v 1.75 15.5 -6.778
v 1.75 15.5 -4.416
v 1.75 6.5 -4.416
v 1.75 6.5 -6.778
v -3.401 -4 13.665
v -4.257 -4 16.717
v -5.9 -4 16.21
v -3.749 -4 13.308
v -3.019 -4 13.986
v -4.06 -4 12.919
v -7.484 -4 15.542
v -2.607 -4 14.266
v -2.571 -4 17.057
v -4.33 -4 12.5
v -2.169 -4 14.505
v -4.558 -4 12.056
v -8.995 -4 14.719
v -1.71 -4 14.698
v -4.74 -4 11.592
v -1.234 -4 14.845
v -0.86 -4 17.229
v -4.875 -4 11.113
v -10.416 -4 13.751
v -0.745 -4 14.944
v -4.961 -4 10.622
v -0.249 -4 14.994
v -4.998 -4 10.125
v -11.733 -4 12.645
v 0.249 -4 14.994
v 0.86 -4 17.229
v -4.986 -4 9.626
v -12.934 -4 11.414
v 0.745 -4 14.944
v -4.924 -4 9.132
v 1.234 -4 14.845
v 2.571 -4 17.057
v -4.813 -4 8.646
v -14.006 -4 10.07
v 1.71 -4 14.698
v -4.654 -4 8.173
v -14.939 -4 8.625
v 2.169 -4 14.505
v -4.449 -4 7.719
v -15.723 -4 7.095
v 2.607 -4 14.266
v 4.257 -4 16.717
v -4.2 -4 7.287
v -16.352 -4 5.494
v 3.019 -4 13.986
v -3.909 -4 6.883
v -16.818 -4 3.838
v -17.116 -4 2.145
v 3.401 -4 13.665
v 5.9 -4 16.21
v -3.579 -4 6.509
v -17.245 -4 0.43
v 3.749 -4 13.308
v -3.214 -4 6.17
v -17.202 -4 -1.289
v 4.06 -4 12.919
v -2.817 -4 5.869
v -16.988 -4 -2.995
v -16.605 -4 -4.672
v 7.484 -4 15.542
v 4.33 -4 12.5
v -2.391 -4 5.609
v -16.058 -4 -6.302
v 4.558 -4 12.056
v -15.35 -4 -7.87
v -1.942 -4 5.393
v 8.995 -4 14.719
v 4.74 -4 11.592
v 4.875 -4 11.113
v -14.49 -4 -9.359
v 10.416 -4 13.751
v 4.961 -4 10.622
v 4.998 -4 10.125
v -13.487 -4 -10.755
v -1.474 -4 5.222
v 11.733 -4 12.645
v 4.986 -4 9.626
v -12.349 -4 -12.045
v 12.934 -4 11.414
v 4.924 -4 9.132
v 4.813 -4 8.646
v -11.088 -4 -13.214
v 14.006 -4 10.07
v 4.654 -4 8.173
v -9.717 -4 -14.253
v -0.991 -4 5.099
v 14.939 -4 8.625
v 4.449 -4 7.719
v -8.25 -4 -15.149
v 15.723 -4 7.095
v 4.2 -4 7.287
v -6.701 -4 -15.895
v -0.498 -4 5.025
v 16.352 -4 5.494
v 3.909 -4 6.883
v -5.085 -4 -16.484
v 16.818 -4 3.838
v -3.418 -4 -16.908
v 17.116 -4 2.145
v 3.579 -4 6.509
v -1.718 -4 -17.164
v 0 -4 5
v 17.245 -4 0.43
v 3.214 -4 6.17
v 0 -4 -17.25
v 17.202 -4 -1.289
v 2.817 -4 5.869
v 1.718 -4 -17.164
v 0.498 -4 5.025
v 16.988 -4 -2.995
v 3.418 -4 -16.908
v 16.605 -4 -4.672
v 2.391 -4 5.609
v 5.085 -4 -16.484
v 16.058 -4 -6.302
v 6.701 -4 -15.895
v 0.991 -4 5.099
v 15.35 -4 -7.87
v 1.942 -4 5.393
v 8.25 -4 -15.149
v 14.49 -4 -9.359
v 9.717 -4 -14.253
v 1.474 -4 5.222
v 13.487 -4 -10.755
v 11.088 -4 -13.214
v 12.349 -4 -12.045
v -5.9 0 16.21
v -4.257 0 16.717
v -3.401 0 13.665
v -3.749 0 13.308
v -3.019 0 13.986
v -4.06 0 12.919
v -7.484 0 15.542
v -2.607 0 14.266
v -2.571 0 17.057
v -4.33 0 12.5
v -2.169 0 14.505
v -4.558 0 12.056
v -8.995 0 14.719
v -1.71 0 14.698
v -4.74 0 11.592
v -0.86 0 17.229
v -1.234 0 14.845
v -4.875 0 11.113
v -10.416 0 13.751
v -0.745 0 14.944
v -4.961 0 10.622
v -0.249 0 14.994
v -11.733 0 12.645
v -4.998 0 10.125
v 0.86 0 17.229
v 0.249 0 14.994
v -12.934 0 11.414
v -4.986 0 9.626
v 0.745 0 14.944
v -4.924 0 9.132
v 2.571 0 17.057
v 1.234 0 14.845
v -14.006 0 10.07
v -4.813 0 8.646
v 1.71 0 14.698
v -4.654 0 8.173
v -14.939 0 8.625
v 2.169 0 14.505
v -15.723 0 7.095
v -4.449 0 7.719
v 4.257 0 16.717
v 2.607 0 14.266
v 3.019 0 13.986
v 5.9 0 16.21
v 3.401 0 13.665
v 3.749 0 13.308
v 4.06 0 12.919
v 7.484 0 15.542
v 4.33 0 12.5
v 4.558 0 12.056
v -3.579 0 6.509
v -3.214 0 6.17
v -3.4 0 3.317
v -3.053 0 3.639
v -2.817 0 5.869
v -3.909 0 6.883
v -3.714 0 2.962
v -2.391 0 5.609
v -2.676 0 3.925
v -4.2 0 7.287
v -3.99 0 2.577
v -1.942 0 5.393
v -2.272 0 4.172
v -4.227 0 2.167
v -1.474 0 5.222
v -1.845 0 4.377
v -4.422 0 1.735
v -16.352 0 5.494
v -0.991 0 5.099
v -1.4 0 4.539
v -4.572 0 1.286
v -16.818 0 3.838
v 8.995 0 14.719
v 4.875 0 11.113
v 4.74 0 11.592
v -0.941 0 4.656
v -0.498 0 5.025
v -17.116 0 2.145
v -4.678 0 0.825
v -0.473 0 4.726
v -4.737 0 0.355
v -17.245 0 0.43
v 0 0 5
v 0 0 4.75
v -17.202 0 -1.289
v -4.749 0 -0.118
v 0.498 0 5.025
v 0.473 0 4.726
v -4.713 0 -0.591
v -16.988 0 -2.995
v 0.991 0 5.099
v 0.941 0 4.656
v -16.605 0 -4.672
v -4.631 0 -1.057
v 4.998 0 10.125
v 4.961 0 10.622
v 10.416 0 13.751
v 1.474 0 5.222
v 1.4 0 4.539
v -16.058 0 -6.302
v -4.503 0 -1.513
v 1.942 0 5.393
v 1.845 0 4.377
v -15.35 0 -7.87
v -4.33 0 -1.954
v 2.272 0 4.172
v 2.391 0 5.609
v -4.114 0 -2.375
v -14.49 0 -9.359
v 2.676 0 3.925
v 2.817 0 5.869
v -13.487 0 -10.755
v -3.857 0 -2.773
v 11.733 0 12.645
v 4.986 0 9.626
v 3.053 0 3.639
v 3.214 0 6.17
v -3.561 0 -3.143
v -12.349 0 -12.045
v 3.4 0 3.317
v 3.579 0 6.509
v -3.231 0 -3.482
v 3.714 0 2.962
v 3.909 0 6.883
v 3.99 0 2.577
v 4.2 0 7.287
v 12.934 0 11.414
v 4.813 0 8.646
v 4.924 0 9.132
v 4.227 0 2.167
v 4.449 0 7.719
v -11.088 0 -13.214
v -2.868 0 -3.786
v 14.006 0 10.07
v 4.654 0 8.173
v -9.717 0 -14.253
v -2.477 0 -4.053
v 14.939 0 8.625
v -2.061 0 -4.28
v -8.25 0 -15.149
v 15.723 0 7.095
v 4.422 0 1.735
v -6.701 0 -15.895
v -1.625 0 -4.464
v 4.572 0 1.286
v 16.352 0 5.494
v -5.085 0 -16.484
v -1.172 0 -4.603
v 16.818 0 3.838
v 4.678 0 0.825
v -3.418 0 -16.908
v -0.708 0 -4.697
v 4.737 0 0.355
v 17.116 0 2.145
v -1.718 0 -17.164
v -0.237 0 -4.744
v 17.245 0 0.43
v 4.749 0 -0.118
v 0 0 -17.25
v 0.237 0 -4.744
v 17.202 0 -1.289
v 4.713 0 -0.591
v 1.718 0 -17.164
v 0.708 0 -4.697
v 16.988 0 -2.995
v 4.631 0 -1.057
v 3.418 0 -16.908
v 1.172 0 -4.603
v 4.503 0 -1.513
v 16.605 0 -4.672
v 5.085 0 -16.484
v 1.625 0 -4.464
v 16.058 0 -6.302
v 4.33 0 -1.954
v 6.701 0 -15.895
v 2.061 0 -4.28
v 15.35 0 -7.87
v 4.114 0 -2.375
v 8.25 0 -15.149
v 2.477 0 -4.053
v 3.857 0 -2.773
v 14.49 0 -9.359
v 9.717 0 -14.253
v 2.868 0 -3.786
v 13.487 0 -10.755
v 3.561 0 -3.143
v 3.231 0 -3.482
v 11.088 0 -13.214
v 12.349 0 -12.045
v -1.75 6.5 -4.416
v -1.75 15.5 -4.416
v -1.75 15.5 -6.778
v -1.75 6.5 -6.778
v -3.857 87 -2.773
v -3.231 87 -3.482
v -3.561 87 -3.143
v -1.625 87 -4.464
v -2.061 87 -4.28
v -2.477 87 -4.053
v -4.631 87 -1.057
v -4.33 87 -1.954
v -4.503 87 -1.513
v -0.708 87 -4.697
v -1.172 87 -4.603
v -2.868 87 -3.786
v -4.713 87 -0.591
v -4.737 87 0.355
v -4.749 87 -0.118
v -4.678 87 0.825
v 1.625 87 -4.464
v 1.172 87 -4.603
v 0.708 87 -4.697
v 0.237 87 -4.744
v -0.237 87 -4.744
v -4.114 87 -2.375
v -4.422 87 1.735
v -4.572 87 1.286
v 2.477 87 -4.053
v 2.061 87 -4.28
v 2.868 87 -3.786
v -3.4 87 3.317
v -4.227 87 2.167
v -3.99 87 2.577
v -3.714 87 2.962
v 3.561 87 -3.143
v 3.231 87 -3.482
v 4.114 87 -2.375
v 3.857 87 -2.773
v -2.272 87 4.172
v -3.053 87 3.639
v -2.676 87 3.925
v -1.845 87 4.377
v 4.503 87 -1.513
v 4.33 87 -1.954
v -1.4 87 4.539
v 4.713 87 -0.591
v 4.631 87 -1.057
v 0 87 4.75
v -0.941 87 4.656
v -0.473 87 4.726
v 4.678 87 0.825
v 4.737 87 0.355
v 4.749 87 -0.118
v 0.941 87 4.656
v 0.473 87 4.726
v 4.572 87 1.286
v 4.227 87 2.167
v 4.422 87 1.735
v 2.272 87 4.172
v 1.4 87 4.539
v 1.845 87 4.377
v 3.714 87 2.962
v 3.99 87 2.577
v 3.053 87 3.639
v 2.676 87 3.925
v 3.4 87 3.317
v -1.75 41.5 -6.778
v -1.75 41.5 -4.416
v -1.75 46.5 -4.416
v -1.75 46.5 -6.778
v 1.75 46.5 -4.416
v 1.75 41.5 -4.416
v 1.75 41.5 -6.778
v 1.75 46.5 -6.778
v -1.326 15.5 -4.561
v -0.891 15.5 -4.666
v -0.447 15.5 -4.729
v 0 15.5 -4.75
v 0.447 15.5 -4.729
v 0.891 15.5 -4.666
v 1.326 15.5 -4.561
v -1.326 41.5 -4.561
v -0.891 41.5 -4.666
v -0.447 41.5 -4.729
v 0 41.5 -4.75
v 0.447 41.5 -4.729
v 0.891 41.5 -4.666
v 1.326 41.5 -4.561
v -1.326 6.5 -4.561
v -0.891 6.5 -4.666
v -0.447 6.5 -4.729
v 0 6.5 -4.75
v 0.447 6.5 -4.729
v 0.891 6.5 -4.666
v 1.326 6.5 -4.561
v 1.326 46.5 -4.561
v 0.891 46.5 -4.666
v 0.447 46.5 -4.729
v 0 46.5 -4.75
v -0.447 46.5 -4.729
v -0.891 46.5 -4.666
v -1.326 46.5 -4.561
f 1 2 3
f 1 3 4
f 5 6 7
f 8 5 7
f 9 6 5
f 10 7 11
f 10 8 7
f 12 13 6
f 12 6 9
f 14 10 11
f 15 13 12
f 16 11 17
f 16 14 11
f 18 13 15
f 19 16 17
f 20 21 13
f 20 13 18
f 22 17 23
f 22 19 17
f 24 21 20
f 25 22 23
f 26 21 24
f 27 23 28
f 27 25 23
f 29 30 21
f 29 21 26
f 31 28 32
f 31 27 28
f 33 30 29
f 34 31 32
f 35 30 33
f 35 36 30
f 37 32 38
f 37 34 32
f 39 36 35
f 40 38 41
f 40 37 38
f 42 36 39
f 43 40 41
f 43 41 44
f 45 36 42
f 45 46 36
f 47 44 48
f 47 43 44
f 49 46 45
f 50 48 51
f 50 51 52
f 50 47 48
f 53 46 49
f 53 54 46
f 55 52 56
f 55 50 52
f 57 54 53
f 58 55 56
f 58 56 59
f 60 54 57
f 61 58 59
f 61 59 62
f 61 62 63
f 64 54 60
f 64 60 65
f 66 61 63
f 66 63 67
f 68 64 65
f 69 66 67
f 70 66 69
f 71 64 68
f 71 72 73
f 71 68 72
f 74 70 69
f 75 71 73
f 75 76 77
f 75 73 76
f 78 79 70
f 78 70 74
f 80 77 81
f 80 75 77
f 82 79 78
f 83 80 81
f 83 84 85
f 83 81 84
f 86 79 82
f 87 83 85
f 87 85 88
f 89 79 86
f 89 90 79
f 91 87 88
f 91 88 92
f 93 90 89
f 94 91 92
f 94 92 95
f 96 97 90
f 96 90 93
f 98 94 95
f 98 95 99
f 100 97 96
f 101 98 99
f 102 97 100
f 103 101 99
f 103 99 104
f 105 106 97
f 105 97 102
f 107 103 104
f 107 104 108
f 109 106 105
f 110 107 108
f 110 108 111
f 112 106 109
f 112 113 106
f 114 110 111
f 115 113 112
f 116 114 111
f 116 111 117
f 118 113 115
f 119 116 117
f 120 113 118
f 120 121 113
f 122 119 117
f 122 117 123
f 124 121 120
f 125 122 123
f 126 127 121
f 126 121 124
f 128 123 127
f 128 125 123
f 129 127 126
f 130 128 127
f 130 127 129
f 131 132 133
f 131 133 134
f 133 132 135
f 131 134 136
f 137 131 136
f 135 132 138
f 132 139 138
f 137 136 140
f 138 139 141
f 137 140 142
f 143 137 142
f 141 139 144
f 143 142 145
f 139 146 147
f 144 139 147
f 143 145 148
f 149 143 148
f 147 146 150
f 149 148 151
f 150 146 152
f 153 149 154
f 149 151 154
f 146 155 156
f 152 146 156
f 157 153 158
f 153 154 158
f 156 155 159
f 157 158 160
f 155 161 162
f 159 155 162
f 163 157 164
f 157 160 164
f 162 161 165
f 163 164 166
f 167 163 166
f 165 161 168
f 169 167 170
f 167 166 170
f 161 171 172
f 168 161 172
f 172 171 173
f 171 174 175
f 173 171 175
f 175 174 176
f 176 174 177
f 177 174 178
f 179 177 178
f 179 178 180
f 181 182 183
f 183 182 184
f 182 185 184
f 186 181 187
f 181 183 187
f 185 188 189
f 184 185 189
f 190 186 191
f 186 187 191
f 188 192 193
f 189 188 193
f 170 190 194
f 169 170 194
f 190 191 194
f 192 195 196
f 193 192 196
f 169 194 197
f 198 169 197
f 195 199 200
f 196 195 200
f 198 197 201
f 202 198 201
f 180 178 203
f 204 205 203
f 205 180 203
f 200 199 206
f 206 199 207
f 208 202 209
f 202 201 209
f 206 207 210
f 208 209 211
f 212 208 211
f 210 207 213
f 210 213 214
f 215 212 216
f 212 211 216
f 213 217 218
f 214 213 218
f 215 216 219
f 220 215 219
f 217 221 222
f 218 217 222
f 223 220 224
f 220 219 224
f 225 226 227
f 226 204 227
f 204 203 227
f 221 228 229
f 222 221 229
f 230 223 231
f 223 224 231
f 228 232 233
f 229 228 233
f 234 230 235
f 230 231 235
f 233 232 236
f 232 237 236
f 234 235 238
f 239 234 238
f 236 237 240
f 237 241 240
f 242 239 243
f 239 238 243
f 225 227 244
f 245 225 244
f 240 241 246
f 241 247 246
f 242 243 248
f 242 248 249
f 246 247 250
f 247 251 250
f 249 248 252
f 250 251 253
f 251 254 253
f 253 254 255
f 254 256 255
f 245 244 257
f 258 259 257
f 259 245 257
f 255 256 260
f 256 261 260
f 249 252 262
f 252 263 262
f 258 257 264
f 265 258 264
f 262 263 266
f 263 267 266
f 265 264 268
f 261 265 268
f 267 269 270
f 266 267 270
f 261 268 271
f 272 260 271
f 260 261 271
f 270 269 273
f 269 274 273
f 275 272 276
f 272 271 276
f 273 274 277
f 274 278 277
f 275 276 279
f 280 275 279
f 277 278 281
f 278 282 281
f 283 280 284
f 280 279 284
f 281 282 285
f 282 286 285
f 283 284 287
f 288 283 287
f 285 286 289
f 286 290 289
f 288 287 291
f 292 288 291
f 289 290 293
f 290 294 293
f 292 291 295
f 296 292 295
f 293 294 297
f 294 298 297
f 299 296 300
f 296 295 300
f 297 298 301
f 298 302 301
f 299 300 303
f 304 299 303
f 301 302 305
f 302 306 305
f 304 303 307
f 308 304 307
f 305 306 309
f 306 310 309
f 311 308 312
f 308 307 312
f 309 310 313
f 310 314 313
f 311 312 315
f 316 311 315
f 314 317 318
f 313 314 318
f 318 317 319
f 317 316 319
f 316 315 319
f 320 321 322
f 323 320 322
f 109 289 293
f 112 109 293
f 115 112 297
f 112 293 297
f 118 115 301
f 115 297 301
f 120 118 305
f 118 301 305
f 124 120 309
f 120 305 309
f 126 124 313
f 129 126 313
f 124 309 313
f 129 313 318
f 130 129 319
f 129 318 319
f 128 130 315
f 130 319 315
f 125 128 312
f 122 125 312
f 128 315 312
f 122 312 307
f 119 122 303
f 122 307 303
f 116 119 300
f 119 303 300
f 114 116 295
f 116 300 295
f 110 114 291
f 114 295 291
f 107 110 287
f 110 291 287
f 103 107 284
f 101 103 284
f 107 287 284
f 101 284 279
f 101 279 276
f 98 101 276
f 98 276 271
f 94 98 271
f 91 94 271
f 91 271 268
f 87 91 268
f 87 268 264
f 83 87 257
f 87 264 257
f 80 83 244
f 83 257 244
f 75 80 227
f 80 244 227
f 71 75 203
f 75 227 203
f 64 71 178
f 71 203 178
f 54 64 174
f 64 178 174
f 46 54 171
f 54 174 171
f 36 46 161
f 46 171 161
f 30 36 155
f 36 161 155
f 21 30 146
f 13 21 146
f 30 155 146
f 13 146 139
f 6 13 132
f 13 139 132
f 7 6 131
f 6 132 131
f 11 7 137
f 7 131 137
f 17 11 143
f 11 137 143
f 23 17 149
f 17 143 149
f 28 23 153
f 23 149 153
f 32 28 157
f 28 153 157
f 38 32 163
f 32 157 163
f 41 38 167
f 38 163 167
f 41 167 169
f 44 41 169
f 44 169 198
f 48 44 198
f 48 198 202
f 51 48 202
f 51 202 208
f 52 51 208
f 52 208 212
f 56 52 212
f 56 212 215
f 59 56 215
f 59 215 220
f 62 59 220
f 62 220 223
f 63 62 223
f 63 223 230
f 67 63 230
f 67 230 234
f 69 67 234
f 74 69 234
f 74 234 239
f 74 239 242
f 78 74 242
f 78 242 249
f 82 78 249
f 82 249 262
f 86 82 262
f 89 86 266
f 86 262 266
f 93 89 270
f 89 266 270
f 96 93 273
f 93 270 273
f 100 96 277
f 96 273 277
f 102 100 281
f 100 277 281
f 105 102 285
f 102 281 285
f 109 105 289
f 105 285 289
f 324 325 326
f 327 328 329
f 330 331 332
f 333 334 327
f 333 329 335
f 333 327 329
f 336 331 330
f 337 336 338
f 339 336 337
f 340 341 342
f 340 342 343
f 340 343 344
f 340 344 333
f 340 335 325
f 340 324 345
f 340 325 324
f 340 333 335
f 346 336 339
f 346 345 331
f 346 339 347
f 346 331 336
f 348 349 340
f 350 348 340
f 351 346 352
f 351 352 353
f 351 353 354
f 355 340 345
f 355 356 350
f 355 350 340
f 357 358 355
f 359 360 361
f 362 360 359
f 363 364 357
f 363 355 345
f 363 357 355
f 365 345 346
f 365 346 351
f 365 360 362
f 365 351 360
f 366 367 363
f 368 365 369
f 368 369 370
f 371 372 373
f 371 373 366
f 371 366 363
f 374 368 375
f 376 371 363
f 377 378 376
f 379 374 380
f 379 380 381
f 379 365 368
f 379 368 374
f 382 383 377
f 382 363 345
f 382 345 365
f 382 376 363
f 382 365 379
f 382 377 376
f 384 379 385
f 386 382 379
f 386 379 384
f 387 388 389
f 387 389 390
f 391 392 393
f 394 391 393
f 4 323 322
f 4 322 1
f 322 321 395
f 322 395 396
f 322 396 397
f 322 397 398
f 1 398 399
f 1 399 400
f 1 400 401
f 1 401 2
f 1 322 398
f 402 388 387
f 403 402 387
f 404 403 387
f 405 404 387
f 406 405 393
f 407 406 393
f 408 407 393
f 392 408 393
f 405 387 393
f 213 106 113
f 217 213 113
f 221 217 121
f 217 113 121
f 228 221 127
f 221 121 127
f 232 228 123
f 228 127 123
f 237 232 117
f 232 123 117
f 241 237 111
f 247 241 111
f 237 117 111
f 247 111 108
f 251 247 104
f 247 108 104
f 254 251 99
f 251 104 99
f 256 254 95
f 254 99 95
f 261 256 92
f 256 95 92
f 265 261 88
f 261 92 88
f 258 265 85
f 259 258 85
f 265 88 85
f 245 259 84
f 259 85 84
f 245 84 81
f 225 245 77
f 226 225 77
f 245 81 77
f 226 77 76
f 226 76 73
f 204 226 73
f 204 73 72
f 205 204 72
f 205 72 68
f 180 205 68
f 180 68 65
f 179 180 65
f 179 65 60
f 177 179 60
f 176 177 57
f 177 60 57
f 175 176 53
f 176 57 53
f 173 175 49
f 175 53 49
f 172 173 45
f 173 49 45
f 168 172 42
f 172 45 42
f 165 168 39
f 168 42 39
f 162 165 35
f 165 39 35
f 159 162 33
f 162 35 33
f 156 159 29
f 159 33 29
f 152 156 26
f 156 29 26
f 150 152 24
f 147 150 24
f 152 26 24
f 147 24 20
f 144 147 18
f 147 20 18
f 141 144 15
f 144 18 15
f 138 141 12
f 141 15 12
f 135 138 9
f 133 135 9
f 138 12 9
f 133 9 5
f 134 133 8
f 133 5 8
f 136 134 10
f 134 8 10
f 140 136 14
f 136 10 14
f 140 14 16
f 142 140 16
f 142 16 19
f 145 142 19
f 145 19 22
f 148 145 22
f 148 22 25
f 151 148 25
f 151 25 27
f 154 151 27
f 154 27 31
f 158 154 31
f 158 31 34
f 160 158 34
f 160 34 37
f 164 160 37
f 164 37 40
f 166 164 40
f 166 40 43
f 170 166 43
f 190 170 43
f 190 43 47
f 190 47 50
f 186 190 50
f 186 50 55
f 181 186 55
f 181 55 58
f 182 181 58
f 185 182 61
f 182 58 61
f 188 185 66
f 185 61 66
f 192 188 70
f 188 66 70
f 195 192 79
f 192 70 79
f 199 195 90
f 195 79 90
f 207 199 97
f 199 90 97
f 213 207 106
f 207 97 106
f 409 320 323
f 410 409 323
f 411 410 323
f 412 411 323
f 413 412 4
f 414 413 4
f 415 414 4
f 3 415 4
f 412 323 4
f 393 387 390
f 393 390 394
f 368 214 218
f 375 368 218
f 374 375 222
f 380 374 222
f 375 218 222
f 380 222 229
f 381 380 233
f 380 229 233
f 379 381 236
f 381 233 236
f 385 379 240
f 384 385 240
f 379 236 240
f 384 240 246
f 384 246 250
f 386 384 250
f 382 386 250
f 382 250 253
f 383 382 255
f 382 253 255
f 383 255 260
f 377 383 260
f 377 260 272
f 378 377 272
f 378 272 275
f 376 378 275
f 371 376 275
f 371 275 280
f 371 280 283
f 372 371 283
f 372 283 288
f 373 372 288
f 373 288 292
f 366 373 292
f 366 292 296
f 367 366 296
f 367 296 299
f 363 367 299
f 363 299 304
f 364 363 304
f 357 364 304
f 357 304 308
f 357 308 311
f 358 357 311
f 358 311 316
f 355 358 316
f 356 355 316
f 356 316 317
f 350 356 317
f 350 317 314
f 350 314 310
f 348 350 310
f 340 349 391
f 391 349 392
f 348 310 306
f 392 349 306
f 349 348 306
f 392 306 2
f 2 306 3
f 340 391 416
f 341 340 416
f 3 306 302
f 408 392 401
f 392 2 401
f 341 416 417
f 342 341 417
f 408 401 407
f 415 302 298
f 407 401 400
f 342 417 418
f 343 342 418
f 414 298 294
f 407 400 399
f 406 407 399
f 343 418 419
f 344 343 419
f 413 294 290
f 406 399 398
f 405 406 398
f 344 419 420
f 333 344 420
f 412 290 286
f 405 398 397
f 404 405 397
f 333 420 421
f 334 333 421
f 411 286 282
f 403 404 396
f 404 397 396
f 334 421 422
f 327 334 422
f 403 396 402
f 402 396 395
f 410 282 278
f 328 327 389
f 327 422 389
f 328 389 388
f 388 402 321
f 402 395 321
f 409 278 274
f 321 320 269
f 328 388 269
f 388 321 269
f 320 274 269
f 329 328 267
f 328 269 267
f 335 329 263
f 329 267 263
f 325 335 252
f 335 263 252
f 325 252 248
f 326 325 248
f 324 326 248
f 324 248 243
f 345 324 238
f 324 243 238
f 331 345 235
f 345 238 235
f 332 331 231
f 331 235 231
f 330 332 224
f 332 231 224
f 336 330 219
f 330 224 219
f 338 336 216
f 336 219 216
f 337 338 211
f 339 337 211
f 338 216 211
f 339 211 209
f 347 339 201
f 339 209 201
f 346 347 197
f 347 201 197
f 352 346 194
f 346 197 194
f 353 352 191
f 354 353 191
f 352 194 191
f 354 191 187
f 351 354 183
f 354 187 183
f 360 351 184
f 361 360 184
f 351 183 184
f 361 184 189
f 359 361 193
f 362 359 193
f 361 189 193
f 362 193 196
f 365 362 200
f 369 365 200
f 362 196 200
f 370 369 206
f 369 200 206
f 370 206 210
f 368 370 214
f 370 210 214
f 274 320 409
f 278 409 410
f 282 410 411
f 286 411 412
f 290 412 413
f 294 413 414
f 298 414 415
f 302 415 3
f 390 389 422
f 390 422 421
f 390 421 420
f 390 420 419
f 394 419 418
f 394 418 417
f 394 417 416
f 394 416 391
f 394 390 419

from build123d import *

# Parameters (mm, degrees)
SKETCH1_R           = 4.75
BOSS_EXTRUDE1_DEPTH = 87
SKETCH2_R           = 17.25
BOSS_EXTRUDE2_DEPTH = 4
SKETCH3_R           = 5
CUT_EXTRUDE1_DEPTH  = 4
BOSS_EXTRUDE3_START = 6.5
SKETCH4_W           = 3.5
SKETCH4_H           = 6.777720856
BOSS_EXTRUDE3_DEPTH = 9
BOSS_EXTRUDE4_START = 41.5
SKETCH5_W           = 3.5
SKETCH5_H           = 6.777720856
BOSS_EXTRUDE4_DEPTH = 5


with BuildPart() as part:
    # Sketch1 → Boss-Extrude1 (new body)
    with BuildSketch(Plane(origin=(0, 0, 0), x_dir=(1, 0, 0), z_dir=(0, 1, 0))):
        with Locations(Location((0, 0, 0), (0, 0, 270))):
            Circle(SKETCH1_R)
    extrude(amount=BOSS_EXTRUDE1_DEPTH)

    # Sketch2 → Boss-Extrude2 (add)
    with BuildSketch(Plane(origin=(0, 0, 0), x_dir=(-1, 0, 0), z_dir=(0, -1, 0))):
        with Locations(Location((0, 0, 0), (0, 0, 90))):
            Circle(SKETCH2_R)
    extrude(amount=BOSS_EXTRUDE2_DEPTH)

    # Sketch3 → Cut-Extrude1 (cut)
    with BuildSketch(Plane.XZ.offset(4)):
        with Locations(Location((0, 10, 0), (0, 0, 270))):
            Circle(SKETCH3_R)
    extrude(amount=-CUT_EXTRUDE1_DEPTH, mode=Mode.SUBTRACT)

    # Sketch4 → Boss-Extrude3 (add)
    with BuildSketch(Plane(origin=(0, 0, 0), x_dir=(1, 0, 0), z_dir=(0, 1, 0)).offset(BOSS_EXTRUDE3_START)):
        with Locations((0, 3.388860428)):
            Rectangle(SKETCH4_W, SKETCH4_H)
    extrude(amount=BOSS_EXTRUDE3_DEPTH)

    # Sketch5 → Boss-Extrude4 (add)
    with BuildSketch(Plane(origin=(0, 0, 0), x_dir=(1, 0, 0), z_dir=(0, 1, 0)).offset(BOSS_EXTRUDE4_START)):
        with Locations((0, 3.388860428)):
            Rectangle(SKETCH5_W, SKETCH5_H)
    extrude(amount=BOSS_EXTRUDE4_DEPTH)


solid = part.part
